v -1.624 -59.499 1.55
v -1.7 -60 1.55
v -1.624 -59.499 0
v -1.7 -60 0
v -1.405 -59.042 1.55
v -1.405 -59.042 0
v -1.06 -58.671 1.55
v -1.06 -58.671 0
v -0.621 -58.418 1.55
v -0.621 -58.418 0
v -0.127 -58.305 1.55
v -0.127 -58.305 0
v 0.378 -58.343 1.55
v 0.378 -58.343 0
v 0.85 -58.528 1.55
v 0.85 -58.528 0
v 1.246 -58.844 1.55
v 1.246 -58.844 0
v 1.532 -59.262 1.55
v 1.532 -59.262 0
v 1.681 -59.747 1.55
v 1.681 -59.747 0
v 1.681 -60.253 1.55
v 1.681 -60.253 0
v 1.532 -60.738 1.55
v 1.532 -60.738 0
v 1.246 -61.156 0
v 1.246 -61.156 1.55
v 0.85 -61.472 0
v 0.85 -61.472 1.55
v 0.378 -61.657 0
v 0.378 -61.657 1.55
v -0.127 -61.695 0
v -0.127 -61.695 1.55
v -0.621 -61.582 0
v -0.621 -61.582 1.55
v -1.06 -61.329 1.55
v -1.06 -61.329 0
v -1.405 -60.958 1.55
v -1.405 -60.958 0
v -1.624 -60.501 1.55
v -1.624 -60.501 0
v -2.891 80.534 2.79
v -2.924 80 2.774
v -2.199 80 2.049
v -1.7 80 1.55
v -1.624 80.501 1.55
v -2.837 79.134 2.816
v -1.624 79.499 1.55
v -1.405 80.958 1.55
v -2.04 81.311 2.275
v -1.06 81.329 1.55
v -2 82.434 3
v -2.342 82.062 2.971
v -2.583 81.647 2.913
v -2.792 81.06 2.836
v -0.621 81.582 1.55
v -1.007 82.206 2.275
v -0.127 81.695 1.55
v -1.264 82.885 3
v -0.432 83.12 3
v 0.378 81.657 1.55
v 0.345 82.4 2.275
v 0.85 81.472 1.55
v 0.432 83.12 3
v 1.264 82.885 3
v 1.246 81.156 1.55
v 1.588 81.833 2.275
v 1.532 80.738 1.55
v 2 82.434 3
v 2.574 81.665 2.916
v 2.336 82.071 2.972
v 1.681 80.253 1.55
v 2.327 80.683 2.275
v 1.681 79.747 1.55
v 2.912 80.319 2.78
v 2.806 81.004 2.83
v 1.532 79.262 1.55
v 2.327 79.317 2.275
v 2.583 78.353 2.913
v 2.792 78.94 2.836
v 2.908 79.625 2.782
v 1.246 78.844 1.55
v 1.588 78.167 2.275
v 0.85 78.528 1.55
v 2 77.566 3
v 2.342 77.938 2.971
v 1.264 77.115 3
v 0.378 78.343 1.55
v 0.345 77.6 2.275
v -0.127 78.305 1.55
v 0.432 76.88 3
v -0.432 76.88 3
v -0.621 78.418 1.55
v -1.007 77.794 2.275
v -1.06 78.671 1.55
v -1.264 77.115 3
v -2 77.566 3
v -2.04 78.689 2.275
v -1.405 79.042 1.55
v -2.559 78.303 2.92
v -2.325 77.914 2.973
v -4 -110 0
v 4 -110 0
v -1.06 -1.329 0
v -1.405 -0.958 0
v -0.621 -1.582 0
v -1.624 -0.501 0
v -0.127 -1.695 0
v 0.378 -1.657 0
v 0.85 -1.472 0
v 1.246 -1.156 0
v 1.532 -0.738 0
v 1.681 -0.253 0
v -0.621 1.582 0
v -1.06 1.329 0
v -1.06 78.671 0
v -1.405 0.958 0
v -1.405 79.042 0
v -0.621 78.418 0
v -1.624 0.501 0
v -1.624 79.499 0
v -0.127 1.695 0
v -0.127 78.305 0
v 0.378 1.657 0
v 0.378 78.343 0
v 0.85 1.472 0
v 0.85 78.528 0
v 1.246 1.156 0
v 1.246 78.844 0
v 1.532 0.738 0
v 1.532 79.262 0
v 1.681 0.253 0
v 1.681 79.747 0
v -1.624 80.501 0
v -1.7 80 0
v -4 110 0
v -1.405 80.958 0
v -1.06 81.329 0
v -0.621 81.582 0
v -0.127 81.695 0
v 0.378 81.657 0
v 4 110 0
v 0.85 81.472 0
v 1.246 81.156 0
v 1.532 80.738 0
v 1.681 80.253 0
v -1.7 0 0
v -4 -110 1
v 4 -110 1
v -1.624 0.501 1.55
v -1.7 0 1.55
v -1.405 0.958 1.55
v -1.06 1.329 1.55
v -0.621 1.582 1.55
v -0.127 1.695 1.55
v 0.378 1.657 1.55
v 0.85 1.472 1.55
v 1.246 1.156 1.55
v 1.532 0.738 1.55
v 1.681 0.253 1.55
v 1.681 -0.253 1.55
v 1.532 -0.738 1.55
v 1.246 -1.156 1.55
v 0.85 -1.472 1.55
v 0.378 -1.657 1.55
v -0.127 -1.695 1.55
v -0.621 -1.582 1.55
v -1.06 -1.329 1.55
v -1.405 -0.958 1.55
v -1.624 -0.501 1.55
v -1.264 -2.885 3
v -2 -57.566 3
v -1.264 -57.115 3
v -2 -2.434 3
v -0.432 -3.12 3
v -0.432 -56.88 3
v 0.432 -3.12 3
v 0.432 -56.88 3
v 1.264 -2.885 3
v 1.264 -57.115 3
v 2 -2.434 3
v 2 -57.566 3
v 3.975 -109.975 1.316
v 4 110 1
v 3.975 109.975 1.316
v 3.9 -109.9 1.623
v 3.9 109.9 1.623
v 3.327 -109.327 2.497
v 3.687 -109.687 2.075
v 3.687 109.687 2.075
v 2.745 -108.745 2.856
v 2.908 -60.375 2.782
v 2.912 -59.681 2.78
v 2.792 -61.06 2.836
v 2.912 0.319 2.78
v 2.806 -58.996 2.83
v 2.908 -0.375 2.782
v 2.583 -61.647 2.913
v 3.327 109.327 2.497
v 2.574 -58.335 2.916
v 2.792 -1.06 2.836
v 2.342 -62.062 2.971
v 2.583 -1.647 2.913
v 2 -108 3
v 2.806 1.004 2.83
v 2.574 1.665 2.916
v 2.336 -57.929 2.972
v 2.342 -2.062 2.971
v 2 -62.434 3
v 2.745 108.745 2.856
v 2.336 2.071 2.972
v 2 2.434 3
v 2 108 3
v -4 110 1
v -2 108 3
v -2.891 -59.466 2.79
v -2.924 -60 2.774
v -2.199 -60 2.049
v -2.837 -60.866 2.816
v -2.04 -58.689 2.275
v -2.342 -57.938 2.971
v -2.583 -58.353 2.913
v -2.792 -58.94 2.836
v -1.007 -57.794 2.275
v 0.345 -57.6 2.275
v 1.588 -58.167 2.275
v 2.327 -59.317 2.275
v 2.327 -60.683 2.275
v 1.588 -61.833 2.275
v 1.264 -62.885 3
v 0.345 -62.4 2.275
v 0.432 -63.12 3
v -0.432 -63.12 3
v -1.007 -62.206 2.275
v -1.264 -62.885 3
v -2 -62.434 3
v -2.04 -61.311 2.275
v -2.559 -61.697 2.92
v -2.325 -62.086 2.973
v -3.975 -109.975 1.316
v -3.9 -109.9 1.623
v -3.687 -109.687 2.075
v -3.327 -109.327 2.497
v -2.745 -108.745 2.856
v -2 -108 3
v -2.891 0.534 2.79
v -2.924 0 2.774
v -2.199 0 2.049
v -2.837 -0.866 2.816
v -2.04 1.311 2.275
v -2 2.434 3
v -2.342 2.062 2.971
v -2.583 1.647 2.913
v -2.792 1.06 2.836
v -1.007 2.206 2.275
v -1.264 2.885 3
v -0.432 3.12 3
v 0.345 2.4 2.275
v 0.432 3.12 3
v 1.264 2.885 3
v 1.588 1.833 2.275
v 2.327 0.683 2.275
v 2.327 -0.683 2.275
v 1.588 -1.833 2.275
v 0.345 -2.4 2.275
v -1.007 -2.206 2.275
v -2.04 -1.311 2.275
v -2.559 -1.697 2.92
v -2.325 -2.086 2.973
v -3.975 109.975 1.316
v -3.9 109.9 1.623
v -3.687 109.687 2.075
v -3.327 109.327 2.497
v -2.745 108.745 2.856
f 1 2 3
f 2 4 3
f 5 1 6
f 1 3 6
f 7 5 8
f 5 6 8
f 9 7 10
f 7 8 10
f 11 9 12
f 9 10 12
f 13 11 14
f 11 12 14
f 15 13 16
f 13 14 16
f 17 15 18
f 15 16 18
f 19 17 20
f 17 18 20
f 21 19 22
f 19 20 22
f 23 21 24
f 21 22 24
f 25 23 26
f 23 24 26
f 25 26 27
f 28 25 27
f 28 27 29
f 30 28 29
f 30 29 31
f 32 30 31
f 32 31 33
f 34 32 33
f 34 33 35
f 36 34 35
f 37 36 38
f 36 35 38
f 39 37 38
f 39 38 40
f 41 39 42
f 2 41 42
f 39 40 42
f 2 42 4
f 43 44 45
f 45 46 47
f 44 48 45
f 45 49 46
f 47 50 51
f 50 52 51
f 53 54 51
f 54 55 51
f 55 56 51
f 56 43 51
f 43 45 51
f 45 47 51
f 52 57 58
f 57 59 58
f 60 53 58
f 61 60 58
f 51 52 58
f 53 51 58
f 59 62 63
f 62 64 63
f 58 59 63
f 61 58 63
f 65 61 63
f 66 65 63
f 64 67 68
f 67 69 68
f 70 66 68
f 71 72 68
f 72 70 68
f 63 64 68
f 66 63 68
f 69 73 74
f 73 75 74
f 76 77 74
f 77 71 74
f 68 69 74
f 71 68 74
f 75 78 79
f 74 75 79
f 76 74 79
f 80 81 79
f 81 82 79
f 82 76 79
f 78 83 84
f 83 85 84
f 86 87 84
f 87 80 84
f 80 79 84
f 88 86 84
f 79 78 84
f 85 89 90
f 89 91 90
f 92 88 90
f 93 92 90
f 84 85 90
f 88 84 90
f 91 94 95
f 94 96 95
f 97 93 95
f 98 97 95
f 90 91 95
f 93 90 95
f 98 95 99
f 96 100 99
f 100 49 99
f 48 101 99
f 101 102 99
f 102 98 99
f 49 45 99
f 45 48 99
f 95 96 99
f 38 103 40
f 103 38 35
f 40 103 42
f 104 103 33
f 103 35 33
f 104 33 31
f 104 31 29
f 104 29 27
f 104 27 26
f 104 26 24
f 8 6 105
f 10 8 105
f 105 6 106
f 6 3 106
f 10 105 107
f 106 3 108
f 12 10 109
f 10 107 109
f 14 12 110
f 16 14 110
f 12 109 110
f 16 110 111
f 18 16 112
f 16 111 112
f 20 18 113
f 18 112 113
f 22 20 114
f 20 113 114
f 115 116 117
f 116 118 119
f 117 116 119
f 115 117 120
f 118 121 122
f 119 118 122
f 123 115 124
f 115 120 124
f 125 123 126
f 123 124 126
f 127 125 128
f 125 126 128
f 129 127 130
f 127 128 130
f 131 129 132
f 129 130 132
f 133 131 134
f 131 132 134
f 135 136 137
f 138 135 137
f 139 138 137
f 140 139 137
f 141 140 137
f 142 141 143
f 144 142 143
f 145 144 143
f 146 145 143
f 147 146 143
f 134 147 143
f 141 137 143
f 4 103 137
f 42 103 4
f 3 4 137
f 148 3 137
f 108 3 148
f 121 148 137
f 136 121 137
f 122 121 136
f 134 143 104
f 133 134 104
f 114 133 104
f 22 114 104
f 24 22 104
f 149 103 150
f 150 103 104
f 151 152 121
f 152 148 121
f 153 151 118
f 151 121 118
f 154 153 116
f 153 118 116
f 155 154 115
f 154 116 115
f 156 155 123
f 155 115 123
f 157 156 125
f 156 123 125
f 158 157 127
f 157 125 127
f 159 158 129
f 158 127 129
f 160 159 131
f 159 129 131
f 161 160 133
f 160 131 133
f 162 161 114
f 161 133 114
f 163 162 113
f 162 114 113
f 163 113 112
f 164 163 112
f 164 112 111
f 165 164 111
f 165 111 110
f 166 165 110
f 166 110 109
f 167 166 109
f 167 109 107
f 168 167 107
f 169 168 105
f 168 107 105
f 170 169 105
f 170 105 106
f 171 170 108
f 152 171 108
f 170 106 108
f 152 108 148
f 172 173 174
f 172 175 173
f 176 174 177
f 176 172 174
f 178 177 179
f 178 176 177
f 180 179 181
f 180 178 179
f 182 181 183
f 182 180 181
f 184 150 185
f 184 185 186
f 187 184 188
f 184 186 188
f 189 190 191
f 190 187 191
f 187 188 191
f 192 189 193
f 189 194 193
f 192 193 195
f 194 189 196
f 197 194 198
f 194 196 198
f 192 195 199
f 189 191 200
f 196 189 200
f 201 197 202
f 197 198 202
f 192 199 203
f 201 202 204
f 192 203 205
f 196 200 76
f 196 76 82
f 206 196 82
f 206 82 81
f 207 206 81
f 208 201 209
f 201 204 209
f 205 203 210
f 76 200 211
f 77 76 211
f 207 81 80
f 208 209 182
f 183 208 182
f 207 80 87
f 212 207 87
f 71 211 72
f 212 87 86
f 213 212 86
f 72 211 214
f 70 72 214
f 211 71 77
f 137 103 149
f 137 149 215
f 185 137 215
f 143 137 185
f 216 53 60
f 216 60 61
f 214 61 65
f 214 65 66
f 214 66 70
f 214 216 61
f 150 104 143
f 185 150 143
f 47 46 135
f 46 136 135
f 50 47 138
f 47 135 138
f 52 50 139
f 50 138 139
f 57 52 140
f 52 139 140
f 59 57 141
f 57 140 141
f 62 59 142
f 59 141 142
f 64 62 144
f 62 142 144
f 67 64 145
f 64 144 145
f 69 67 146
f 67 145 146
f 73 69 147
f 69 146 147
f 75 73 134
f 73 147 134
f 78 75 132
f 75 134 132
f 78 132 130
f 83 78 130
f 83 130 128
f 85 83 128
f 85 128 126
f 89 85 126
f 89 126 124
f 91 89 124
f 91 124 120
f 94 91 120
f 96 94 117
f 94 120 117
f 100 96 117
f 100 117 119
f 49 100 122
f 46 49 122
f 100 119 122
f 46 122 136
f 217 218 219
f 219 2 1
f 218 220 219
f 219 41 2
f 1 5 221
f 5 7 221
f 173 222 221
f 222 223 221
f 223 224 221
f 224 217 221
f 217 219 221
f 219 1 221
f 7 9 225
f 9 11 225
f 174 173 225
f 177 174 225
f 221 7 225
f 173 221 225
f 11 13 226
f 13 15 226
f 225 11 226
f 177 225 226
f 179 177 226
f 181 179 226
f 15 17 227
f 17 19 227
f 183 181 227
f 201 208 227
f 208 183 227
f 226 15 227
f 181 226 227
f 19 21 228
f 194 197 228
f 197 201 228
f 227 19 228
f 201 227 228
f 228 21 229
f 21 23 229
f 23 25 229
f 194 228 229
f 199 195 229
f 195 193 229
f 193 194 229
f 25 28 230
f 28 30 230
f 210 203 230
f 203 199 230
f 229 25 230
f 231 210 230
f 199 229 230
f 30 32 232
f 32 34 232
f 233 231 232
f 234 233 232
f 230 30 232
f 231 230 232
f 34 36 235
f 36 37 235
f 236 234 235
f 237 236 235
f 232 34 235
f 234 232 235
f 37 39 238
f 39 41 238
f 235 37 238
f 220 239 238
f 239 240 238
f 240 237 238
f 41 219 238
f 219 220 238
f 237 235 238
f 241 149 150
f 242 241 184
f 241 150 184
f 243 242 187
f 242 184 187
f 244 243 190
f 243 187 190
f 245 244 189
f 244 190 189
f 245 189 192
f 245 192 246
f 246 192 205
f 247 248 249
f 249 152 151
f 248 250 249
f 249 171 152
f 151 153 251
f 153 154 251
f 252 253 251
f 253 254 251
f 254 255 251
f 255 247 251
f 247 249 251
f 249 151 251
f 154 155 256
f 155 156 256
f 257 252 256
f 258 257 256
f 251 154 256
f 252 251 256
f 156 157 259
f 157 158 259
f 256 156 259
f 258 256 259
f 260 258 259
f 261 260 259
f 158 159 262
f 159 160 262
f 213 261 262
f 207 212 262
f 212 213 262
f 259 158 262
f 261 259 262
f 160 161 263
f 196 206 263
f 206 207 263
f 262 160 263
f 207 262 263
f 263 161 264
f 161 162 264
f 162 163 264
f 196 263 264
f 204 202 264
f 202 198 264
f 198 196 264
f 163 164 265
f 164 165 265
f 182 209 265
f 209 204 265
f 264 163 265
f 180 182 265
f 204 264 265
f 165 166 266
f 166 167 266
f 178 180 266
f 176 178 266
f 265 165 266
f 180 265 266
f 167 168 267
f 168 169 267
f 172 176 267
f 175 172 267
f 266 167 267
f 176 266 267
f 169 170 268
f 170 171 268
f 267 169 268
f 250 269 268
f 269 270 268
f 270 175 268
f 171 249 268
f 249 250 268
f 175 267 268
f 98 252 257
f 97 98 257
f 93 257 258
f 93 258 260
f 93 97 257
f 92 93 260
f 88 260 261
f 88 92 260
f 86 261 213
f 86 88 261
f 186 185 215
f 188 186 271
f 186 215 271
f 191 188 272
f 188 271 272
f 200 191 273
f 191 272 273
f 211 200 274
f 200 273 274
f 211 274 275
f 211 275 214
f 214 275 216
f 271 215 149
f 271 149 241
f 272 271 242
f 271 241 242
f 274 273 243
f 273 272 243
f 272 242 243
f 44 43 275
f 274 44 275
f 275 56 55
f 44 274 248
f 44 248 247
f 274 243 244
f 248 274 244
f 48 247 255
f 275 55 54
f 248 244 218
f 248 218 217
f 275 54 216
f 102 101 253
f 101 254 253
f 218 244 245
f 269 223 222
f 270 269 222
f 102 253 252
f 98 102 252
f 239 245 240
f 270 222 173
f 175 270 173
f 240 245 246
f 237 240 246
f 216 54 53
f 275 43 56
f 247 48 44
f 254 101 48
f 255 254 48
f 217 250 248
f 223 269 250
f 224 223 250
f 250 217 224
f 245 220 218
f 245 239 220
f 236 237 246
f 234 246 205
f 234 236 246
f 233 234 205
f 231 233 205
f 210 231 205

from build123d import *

# Parameters (mm, degrees)
SKETCH_1_W                   = 8
SKETCH_1_H                   = 220
SKETCH_1_R                   = 1.6
EXTRUDE_1_DEPTH              = 3
HOLE_WIZARD_M3_1_D           = 3.4
HOLE_WIZARD_M3_1_DEPTH       = 5
HOLE_WIZARD_M3_1_CSINK_D     = 6.3
HOLE_WIZARD_M3_1_CSINK_ANGLE = 90
HOLE_WIZARD_M3_1_TIP         = 1.021463052
FILLET_1_R                   = 2


with BuildPart() as part:
    # ｽｹｯﾁ1 → ﾎﾞｽ - 押し出し1 (new body)
    with BuildSketch(Plane.XY):
        Rectangle(SKETCH_1_W, SKETCH_1_H)
        with Locations((0, 80)):
            Circle(SKETCH_1_R, mode=Mode.SUBTRACT)
        Circle(SKETCH_1_R, mode=Mode.SUBTRACT)
        with Locations((0, -60)):
            Circle(SKETCH_1_R, mode=Mode.SUBTRACT)
    extrude(amount=EXTRUDE_1_DEPTH)

    # M3 平皿頭ねじ用皿穴1
    with Locations(Plane.XY.offset(3)):
        with Locations((0, -60), (0, 0), (0, 80)):
            CounterSinkHole(HOLE_WIZARD_M3_1_D / 2, HOLE_WIZARD_M3_1_CSINK_D / 2, depth=HOLE_WIZARD_M3_1_DEPTH, counter_sink_angle=HOLE_WIZARD_M3_1_CSINK_ANGLE)
            with Locations((0, 0, -(HOLE_WIZARD_M3_1_DEPTH + HOLE_WIZARD_M3_1_TIP / 2))):  # 118° drill point
                Cone(0, HOLE_WIZARD_M3_1_D / 2, HOLE_WIZARD_M3_1_TIP, mode=Mode.SUBTRACT)

    # ﾌｨﾚｯﾄ1
    # the kernel refuses this fillet: 2 mm, written as the material it takes off along each edge
    with BuildSketch(Plane(origin=(4, 115, 3), x_dir=(-1, 0, 0), z_dir=(0, -1, 0)), Plane(origin=(-4, -115, 3), x_dir=(1, 0, 0), z_dir=(0, 1, 0))) as fillet_1_piece_1:
        with BuildLine():
            CenterArc((FILLET_1_R, FILLET_1_R), FILLET_1_R, 180, 90)
            Line((0, FILLET_1_R), (0, 0))
            Line((0, 0), (FILLET_1_R, 0))
        make_face()
    extrude(amount=230, mode=Mode.SUBTRACT)
    with BuildSketch(Plane(origin=(-9, 110, 3), x_dir=(0, -1, 0), z_dir=(1, 0, 0))) as fillet_1_piece_2:
        with BuildLine():
            CenterArc((FILLET_1_R, FILLET_1_R), FILLET_1_R, 180, 90)
            Line((0, FILLET_1_R), (0, 0))
            Line((0, 0), (FILLET_1_R, 0))
        make_face()
    extrude(amount=18, mode=Mode.SUBTRACT)
    with BuildSketch(Plane(origin=(9, -110, 3), x_dir=(0, 0, -1), z_dir=(-1, 0, 0))) as fillet_1_piece_3:
        with BuildLine():
            CenterArc((FILLET_1_R, -FILLET_1_R), FILLET_1_R, 90, 90)
            Line((0, -FILLET_1_R), (0, 0))
            Line((0, 0), (FILLET_1_R, 0))
        make_face()
    extrude(amount=18, mode=Mode.SUBTRACT)


solid = part.part
